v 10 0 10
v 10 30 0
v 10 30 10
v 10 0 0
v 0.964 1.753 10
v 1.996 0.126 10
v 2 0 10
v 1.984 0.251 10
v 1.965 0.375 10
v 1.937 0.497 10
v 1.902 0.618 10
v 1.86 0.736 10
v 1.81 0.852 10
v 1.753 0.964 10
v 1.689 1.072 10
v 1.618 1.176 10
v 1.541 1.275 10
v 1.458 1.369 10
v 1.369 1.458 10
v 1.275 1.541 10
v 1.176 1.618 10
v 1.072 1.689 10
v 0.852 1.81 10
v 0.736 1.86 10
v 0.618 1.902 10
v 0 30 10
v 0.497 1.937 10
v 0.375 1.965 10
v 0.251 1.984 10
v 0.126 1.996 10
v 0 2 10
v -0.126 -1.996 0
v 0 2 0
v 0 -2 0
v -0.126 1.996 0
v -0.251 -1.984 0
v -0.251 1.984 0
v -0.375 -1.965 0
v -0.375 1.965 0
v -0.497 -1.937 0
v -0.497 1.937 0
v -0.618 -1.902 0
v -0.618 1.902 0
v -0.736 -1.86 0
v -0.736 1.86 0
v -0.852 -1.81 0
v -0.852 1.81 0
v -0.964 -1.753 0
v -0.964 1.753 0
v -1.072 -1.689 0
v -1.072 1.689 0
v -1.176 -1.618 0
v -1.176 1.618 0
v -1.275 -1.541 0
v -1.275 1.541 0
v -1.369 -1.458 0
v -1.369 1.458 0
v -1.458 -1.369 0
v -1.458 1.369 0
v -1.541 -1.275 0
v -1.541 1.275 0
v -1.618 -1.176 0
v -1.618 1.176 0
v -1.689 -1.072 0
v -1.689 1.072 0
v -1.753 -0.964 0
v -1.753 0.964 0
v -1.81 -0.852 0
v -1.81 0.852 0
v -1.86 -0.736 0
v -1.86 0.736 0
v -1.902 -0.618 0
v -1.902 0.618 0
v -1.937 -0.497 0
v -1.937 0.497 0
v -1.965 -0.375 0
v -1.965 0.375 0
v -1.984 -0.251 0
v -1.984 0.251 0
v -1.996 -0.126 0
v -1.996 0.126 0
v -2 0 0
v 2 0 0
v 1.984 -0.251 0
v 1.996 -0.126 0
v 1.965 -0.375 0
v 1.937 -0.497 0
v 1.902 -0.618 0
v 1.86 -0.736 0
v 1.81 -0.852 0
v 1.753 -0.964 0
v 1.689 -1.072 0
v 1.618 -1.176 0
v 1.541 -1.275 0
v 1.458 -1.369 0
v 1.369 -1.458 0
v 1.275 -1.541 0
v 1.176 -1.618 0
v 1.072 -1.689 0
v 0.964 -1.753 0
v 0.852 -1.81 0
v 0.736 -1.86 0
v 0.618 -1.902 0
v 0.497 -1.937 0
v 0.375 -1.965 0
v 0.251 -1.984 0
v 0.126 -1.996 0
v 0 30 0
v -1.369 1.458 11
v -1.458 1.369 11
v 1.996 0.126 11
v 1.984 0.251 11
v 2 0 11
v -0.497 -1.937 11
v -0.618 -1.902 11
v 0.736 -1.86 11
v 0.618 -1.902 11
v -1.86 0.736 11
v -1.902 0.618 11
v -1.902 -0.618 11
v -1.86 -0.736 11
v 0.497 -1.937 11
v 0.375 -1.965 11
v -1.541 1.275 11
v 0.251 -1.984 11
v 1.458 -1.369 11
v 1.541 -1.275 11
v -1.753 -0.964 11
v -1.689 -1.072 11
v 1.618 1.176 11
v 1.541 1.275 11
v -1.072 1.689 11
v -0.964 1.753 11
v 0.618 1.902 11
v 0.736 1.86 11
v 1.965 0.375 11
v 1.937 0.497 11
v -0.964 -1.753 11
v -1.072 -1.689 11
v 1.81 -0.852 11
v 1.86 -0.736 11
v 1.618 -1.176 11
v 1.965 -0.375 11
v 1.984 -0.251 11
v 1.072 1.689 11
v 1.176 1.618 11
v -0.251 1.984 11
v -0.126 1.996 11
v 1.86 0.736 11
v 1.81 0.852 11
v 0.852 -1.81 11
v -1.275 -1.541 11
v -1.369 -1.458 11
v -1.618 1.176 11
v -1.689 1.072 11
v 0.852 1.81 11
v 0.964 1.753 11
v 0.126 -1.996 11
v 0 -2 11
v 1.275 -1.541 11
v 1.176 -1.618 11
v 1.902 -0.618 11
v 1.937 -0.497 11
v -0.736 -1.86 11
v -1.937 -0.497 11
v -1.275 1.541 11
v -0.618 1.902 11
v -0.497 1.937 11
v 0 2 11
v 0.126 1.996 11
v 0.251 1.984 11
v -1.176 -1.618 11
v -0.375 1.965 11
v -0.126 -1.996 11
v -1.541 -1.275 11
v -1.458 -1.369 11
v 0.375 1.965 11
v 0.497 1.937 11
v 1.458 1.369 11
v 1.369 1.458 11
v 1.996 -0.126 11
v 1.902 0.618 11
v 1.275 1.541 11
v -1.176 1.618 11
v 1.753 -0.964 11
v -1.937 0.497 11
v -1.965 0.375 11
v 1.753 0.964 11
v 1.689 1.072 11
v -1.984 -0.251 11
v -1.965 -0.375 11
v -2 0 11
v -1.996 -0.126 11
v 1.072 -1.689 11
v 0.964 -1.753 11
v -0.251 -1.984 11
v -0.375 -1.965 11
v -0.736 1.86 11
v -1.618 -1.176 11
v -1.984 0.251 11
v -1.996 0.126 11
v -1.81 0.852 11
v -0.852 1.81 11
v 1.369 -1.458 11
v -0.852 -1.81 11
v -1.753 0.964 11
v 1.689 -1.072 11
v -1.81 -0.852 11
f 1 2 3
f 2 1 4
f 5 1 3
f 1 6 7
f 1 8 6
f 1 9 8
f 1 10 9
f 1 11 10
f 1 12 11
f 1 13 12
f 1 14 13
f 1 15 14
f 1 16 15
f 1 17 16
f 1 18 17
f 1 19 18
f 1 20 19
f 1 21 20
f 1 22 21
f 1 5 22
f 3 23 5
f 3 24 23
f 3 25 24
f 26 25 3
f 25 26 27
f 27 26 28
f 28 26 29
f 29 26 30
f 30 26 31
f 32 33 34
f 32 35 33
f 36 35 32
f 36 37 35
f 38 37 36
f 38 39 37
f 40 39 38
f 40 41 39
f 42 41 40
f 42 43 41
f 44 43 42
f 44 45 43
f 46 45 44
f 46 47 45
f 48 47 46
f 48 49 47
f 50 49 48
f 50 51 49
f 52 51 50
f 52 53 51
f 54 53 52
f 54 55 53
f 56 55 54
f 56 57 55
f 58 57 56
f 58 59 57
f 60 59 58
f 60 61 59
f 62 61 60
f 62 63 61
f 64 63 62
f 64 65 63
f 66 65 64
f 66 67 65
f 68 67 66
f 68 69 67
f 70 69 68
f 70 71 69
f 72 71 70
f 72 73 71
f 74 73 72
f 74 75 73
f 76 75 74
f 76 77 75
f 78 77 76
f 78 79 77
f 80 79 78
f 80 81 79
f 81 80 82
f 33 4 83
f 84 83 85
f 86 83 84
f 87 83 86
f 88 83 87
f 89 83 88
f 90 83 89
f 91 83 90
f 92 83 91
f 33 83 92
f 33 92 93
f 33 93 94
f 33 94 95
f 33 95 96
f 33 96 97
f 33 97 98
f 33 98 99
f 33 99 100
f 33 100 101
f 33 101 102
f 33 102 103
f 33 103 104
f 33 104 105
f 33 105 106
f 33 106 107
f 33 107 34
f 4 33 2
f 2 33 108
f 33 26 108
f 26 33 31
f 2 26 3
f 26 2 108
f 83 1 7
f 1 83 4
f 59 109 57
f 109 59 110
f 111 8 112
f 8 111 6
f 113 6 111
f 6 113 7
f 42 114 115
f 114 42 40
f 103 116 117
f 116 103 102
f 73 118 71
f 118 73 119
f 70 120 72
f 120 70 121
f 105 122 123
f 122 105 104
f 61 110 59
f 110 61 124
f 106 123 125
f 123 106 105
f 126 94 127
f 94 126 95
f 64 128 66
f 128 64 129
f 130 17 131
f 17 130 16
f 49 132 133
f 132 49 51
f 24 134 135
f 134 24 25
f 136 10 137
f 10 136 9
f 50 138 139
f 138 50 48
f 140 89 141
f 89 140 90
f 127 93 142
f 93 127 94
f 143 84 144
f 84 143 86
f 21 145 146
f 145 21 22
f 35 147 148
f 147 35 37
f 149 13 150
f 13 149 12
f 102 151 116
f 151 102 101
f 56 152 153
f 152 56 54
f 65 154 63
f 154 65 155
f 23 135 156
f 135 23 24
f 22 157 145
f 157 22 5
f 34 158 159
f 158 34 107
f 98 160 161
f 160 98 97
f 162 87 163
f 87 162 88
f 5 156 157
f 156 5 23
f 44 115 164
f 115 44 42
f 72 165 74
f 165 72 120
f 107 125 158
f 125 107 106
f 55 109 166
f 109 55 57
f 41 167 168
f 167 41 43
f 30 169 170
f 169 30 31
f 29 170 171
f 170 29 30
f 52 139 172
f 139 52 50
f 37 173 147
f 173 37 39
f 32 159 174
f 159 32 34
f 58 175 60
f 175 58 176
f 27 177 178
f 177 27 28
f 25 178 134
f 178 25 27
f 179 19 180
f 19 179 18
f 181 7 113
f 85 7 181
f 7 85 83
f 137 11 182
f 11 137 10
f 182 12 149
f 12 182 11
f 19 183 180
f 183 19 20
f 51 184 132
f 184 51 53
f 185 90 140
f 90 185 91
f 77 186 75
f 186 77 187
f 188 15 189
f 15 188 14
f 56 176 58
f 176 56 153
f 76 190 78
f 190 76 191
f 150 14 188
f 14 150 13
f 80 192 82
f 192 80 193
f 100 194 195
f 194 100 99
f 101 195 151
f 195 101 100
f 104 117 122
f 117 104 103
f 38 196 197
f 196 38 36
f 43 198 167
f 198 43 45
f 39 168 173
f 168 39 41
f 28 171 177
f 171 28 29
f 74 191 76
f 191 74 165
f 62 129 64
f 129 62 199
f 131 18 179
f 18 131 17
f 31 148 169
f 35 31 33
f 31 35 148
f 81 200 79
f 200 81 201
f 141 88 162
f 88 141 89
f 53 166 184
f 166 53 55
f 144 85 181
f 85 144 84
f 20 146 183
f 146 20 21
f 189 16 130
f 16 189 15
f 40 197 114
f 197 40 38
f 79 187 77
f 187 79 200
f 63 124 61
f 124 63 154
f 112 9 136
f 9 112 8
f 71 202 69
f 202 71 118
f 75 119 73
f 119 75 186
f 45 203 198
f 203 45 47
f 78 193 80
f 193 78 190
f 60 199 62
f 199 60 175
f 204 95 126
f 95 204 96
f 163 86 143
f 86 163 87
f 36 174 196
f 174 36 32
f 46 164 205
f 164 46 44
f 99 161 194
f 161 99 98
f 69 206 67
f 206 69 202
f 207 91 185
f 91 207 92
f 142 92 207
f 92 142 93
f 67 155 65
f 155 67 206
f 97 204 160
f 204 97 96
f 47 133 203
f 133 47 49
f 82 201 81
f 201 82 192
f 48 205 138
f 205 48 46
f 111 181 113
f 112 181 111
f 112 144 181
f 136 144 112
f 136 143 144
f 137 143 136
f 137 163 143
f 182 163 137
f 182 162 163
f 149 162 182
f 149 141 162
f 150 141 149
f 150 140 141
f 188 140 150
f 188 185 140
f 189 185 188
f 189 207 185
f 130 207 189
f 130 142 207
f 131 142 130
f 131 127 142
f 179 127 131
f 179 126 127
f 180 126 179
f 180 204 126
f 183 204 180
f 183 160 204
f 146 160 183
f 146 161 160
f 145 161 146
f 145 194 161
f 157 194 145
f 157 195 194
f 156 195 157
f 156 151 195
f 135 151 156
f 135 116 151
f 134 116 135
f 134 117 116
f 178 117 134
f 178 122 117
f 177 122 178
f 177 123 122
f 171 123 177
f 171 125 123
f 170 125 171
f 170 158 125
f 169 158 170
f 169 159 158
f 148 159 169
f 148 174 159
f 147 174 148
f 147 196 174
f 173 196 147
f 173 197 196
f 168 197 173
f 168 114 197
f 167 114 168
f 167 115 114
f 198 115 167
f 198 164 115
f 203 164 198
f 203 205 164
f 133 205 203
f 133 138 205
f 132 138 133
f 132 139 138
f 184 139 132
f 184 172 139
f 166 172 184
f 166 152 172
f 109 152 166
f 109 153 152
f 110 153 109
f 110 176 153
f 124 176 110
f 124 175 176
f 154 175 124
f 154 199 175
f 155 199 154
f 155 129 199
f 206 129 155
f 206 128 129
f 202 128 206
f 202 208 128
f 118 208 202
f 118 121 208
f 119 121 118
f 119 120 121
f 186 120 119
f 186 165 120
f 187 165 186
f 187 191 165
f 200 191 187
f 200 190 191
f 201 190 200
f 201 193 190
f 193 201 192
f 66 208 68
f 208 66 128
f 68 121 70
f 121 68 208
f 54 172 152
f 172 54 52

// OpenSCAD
outerHeight = 10;
outerWidth = 10;
outerLength = 30;

fuehrungDelta = 5;
fuehrungRadius = 2;
screwRadius = 2;

color( "green" ) cube([outerWidth, outerLength, outerHeight] );
translate([fuehrungRadius + fuehrungDelta,outerLength/2,0]) {
color( "red" ) cylinder(h=outerHeight, r=fuehrungRadius, $fn=100);
}

cylinder(h=outerHeight+1, r=fuehrungRadius, $fn=100);
cylinder(h=outerHeight+1, r=fuehrungRadius, $fn=100);

   
